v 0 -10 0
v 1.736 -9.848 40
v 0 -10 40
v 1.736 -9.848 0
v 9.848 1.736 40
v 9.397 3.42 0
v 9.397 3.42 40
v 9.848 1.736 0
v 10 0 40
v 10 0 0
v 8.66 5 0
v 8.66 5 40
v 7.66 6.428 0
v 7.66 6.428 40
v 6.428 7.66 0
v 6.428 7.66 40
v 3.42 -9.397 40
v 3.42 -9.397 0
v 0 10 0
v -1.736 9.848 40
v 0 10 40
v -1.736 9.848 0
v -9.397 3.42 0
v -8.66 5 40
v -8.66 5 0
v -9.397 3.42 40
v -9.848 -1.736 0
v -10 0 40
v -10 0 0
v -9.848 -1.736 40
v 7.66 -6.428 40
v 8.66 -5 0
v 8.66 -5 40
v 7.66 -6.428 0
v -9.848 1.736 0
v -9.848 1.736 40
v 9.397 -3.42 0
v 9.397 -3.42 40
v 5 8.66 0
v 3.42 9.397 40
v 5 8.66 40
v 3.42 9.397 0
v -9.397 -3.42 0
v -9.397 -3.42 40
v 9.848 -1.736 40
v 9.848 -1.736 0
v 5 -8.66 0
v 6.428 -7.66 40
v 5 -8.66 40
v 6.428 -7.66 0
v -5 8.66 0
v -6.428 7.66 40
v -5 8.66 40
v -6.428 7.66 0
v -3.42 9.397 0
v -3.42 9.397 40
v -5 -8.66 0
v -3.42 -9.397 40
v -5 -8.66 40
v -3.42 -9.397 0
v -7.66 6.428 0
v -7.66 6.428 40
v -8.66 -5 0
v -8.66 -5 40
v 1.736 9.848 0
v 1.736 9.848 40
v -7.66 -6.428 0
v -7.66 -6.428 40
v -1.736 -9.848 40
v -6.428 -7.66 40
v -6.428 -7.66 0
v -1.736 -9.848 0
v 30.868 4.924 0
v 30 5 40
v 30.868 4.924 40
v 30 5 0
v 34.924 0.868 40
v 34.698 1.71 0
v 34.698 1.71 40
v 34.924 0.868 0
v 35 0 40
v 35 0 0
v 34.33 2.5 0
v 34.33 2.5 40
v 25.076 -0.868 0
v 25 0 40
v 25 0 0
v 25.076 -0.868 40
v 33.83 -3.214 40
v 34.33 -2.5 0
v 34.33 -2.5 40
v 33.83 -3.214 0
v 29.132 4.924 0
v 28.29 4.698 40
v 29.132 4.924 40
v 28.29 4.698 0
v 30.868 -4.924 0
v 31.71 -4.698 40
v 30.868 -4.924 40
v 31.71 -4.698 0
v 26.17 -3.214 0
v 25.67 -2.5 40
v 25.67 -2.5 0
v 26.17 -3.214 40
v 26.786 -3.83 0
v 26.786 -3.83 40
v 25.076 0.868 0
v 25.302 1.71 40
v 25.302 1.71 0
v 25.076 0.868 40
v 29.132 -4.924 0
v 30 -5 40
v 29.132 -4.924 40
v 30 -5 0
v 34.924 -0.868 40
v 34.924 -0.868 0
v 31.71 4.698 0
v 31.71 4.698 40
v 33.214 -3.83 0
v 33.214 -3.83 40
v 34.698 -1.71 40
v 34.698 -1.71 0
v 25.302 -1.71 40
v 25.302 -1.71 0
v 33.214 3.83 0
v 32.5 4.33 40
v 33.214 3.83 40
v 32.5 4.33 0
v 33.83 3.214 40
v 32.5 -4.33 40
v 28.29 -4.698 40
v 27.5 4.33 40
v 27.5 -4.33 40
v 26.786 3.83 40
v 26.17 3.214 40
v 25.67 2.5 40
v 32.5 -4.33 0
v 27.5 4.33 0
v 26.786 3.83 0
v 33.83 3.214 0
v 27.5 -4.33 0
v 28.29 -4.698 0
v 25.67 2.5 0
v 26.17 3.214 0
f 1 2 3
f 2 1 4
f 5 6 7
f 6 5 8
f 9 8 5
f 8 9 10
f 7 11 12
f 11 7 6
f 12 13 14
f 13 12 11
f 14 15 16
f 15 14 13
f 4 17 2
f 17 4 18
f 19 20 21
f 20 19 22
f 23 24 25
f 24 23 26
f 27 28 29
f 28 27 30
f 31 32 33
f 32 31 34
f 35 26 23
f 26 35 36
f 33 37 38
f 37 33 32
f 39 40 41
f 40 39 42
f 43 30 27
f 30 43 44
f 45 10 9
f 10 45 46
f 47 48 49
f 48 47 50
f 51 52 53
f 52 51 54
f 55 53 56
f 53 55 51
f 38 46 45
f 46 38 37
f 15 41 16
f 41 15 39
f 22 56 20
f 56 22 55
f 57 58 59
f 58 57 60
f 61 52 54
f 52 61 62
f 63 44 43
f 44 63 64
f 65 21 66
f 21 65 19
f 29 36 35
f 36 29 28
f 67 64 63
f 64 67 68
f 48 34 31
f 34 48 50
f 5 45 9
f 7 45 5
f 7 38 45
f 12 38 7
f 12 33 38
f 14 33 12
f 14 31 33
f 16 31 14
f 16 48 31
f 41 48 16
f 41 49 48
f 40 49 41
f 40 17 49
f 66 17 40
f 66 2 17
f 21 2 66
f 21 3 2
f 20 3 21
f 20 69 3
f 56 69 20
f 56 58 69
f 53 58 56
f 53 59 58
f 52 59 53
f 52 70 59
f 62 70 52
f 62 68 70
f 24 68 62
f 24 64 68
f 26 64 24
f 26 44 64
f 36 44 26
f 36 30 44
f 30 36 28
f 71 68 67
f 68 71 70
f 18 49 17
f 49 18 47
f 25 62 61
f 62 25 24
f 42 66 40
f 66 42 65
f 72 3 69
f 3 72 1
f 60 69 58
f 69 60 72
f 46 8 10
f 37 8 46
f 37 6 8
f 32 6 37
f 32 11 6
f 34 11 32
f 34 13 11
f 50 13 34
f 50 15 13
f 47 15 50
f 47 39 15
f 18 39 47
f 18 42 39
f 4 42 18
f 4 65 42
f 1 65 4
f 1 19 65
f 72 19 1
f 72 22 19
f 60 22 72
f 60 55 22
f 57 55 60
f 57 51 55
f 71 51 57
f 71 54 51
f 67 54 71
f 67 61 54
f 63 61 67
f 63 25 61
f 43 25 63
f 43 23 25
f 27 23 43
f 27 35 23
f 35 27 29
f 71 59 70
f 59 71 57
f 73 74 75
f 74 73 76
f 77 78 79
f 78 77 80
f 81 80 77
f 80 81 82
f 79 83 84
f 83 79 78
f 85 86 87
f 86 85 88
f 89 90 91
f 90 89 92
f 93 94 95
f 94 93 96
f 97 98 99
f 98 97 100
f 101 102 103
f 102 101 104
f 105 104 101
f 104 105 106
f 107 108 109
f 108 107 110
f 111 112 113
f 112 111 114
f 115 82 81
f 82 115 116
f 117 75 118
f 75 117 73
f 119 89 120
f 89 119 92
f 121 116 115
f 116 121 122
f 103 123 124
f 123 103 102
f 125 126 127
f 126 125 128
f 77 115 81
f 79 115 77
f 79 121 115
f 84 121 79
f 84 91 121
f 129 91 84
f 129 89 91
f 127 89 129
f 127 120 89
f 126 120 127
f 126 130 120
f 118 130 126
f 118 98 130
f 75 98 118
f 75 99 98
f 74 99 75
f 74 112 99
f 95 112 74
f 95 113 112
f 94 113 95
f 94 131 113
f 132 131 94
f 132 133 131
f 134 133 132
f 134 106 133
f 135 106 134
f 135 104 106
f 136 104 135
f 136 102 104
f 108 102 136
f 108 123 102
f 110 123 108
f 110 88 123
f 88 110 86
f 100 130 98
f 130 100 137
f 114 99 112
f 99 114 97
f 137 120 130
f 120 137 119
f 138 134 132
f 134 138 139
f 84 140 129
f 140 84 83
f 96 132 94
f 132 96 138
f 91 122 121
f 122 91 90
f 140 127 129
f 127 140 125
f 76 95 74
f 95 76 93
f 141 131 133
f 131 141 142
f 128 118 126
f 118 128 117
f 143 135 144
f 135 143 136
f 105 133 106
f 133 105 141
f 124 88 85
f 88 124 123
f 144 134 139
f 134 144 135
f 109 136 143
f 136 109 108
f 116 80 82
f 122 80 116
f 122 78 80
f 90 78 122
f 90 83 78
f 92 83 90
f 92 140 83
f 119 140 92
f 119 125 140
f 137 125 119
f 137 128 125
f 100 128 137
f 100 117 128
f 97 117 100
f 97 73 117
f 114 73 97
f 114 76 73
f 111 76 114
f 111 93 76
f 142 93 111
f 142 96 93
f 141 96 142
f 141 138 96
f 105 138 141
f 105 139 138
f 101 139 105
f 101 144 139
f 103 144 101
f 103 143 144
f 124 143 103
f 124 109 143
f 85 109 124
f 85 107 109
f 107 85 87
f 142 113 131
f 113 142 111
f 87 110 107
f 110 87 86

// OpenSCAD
$fn=36;
cylinder(r=10,h=40);
translate([30,0,0])cylinder(r=5,h=40);

//screen capture settings
$vpr=[70,0,25];
$vpd=140;
$vpt=[8,15,16];
